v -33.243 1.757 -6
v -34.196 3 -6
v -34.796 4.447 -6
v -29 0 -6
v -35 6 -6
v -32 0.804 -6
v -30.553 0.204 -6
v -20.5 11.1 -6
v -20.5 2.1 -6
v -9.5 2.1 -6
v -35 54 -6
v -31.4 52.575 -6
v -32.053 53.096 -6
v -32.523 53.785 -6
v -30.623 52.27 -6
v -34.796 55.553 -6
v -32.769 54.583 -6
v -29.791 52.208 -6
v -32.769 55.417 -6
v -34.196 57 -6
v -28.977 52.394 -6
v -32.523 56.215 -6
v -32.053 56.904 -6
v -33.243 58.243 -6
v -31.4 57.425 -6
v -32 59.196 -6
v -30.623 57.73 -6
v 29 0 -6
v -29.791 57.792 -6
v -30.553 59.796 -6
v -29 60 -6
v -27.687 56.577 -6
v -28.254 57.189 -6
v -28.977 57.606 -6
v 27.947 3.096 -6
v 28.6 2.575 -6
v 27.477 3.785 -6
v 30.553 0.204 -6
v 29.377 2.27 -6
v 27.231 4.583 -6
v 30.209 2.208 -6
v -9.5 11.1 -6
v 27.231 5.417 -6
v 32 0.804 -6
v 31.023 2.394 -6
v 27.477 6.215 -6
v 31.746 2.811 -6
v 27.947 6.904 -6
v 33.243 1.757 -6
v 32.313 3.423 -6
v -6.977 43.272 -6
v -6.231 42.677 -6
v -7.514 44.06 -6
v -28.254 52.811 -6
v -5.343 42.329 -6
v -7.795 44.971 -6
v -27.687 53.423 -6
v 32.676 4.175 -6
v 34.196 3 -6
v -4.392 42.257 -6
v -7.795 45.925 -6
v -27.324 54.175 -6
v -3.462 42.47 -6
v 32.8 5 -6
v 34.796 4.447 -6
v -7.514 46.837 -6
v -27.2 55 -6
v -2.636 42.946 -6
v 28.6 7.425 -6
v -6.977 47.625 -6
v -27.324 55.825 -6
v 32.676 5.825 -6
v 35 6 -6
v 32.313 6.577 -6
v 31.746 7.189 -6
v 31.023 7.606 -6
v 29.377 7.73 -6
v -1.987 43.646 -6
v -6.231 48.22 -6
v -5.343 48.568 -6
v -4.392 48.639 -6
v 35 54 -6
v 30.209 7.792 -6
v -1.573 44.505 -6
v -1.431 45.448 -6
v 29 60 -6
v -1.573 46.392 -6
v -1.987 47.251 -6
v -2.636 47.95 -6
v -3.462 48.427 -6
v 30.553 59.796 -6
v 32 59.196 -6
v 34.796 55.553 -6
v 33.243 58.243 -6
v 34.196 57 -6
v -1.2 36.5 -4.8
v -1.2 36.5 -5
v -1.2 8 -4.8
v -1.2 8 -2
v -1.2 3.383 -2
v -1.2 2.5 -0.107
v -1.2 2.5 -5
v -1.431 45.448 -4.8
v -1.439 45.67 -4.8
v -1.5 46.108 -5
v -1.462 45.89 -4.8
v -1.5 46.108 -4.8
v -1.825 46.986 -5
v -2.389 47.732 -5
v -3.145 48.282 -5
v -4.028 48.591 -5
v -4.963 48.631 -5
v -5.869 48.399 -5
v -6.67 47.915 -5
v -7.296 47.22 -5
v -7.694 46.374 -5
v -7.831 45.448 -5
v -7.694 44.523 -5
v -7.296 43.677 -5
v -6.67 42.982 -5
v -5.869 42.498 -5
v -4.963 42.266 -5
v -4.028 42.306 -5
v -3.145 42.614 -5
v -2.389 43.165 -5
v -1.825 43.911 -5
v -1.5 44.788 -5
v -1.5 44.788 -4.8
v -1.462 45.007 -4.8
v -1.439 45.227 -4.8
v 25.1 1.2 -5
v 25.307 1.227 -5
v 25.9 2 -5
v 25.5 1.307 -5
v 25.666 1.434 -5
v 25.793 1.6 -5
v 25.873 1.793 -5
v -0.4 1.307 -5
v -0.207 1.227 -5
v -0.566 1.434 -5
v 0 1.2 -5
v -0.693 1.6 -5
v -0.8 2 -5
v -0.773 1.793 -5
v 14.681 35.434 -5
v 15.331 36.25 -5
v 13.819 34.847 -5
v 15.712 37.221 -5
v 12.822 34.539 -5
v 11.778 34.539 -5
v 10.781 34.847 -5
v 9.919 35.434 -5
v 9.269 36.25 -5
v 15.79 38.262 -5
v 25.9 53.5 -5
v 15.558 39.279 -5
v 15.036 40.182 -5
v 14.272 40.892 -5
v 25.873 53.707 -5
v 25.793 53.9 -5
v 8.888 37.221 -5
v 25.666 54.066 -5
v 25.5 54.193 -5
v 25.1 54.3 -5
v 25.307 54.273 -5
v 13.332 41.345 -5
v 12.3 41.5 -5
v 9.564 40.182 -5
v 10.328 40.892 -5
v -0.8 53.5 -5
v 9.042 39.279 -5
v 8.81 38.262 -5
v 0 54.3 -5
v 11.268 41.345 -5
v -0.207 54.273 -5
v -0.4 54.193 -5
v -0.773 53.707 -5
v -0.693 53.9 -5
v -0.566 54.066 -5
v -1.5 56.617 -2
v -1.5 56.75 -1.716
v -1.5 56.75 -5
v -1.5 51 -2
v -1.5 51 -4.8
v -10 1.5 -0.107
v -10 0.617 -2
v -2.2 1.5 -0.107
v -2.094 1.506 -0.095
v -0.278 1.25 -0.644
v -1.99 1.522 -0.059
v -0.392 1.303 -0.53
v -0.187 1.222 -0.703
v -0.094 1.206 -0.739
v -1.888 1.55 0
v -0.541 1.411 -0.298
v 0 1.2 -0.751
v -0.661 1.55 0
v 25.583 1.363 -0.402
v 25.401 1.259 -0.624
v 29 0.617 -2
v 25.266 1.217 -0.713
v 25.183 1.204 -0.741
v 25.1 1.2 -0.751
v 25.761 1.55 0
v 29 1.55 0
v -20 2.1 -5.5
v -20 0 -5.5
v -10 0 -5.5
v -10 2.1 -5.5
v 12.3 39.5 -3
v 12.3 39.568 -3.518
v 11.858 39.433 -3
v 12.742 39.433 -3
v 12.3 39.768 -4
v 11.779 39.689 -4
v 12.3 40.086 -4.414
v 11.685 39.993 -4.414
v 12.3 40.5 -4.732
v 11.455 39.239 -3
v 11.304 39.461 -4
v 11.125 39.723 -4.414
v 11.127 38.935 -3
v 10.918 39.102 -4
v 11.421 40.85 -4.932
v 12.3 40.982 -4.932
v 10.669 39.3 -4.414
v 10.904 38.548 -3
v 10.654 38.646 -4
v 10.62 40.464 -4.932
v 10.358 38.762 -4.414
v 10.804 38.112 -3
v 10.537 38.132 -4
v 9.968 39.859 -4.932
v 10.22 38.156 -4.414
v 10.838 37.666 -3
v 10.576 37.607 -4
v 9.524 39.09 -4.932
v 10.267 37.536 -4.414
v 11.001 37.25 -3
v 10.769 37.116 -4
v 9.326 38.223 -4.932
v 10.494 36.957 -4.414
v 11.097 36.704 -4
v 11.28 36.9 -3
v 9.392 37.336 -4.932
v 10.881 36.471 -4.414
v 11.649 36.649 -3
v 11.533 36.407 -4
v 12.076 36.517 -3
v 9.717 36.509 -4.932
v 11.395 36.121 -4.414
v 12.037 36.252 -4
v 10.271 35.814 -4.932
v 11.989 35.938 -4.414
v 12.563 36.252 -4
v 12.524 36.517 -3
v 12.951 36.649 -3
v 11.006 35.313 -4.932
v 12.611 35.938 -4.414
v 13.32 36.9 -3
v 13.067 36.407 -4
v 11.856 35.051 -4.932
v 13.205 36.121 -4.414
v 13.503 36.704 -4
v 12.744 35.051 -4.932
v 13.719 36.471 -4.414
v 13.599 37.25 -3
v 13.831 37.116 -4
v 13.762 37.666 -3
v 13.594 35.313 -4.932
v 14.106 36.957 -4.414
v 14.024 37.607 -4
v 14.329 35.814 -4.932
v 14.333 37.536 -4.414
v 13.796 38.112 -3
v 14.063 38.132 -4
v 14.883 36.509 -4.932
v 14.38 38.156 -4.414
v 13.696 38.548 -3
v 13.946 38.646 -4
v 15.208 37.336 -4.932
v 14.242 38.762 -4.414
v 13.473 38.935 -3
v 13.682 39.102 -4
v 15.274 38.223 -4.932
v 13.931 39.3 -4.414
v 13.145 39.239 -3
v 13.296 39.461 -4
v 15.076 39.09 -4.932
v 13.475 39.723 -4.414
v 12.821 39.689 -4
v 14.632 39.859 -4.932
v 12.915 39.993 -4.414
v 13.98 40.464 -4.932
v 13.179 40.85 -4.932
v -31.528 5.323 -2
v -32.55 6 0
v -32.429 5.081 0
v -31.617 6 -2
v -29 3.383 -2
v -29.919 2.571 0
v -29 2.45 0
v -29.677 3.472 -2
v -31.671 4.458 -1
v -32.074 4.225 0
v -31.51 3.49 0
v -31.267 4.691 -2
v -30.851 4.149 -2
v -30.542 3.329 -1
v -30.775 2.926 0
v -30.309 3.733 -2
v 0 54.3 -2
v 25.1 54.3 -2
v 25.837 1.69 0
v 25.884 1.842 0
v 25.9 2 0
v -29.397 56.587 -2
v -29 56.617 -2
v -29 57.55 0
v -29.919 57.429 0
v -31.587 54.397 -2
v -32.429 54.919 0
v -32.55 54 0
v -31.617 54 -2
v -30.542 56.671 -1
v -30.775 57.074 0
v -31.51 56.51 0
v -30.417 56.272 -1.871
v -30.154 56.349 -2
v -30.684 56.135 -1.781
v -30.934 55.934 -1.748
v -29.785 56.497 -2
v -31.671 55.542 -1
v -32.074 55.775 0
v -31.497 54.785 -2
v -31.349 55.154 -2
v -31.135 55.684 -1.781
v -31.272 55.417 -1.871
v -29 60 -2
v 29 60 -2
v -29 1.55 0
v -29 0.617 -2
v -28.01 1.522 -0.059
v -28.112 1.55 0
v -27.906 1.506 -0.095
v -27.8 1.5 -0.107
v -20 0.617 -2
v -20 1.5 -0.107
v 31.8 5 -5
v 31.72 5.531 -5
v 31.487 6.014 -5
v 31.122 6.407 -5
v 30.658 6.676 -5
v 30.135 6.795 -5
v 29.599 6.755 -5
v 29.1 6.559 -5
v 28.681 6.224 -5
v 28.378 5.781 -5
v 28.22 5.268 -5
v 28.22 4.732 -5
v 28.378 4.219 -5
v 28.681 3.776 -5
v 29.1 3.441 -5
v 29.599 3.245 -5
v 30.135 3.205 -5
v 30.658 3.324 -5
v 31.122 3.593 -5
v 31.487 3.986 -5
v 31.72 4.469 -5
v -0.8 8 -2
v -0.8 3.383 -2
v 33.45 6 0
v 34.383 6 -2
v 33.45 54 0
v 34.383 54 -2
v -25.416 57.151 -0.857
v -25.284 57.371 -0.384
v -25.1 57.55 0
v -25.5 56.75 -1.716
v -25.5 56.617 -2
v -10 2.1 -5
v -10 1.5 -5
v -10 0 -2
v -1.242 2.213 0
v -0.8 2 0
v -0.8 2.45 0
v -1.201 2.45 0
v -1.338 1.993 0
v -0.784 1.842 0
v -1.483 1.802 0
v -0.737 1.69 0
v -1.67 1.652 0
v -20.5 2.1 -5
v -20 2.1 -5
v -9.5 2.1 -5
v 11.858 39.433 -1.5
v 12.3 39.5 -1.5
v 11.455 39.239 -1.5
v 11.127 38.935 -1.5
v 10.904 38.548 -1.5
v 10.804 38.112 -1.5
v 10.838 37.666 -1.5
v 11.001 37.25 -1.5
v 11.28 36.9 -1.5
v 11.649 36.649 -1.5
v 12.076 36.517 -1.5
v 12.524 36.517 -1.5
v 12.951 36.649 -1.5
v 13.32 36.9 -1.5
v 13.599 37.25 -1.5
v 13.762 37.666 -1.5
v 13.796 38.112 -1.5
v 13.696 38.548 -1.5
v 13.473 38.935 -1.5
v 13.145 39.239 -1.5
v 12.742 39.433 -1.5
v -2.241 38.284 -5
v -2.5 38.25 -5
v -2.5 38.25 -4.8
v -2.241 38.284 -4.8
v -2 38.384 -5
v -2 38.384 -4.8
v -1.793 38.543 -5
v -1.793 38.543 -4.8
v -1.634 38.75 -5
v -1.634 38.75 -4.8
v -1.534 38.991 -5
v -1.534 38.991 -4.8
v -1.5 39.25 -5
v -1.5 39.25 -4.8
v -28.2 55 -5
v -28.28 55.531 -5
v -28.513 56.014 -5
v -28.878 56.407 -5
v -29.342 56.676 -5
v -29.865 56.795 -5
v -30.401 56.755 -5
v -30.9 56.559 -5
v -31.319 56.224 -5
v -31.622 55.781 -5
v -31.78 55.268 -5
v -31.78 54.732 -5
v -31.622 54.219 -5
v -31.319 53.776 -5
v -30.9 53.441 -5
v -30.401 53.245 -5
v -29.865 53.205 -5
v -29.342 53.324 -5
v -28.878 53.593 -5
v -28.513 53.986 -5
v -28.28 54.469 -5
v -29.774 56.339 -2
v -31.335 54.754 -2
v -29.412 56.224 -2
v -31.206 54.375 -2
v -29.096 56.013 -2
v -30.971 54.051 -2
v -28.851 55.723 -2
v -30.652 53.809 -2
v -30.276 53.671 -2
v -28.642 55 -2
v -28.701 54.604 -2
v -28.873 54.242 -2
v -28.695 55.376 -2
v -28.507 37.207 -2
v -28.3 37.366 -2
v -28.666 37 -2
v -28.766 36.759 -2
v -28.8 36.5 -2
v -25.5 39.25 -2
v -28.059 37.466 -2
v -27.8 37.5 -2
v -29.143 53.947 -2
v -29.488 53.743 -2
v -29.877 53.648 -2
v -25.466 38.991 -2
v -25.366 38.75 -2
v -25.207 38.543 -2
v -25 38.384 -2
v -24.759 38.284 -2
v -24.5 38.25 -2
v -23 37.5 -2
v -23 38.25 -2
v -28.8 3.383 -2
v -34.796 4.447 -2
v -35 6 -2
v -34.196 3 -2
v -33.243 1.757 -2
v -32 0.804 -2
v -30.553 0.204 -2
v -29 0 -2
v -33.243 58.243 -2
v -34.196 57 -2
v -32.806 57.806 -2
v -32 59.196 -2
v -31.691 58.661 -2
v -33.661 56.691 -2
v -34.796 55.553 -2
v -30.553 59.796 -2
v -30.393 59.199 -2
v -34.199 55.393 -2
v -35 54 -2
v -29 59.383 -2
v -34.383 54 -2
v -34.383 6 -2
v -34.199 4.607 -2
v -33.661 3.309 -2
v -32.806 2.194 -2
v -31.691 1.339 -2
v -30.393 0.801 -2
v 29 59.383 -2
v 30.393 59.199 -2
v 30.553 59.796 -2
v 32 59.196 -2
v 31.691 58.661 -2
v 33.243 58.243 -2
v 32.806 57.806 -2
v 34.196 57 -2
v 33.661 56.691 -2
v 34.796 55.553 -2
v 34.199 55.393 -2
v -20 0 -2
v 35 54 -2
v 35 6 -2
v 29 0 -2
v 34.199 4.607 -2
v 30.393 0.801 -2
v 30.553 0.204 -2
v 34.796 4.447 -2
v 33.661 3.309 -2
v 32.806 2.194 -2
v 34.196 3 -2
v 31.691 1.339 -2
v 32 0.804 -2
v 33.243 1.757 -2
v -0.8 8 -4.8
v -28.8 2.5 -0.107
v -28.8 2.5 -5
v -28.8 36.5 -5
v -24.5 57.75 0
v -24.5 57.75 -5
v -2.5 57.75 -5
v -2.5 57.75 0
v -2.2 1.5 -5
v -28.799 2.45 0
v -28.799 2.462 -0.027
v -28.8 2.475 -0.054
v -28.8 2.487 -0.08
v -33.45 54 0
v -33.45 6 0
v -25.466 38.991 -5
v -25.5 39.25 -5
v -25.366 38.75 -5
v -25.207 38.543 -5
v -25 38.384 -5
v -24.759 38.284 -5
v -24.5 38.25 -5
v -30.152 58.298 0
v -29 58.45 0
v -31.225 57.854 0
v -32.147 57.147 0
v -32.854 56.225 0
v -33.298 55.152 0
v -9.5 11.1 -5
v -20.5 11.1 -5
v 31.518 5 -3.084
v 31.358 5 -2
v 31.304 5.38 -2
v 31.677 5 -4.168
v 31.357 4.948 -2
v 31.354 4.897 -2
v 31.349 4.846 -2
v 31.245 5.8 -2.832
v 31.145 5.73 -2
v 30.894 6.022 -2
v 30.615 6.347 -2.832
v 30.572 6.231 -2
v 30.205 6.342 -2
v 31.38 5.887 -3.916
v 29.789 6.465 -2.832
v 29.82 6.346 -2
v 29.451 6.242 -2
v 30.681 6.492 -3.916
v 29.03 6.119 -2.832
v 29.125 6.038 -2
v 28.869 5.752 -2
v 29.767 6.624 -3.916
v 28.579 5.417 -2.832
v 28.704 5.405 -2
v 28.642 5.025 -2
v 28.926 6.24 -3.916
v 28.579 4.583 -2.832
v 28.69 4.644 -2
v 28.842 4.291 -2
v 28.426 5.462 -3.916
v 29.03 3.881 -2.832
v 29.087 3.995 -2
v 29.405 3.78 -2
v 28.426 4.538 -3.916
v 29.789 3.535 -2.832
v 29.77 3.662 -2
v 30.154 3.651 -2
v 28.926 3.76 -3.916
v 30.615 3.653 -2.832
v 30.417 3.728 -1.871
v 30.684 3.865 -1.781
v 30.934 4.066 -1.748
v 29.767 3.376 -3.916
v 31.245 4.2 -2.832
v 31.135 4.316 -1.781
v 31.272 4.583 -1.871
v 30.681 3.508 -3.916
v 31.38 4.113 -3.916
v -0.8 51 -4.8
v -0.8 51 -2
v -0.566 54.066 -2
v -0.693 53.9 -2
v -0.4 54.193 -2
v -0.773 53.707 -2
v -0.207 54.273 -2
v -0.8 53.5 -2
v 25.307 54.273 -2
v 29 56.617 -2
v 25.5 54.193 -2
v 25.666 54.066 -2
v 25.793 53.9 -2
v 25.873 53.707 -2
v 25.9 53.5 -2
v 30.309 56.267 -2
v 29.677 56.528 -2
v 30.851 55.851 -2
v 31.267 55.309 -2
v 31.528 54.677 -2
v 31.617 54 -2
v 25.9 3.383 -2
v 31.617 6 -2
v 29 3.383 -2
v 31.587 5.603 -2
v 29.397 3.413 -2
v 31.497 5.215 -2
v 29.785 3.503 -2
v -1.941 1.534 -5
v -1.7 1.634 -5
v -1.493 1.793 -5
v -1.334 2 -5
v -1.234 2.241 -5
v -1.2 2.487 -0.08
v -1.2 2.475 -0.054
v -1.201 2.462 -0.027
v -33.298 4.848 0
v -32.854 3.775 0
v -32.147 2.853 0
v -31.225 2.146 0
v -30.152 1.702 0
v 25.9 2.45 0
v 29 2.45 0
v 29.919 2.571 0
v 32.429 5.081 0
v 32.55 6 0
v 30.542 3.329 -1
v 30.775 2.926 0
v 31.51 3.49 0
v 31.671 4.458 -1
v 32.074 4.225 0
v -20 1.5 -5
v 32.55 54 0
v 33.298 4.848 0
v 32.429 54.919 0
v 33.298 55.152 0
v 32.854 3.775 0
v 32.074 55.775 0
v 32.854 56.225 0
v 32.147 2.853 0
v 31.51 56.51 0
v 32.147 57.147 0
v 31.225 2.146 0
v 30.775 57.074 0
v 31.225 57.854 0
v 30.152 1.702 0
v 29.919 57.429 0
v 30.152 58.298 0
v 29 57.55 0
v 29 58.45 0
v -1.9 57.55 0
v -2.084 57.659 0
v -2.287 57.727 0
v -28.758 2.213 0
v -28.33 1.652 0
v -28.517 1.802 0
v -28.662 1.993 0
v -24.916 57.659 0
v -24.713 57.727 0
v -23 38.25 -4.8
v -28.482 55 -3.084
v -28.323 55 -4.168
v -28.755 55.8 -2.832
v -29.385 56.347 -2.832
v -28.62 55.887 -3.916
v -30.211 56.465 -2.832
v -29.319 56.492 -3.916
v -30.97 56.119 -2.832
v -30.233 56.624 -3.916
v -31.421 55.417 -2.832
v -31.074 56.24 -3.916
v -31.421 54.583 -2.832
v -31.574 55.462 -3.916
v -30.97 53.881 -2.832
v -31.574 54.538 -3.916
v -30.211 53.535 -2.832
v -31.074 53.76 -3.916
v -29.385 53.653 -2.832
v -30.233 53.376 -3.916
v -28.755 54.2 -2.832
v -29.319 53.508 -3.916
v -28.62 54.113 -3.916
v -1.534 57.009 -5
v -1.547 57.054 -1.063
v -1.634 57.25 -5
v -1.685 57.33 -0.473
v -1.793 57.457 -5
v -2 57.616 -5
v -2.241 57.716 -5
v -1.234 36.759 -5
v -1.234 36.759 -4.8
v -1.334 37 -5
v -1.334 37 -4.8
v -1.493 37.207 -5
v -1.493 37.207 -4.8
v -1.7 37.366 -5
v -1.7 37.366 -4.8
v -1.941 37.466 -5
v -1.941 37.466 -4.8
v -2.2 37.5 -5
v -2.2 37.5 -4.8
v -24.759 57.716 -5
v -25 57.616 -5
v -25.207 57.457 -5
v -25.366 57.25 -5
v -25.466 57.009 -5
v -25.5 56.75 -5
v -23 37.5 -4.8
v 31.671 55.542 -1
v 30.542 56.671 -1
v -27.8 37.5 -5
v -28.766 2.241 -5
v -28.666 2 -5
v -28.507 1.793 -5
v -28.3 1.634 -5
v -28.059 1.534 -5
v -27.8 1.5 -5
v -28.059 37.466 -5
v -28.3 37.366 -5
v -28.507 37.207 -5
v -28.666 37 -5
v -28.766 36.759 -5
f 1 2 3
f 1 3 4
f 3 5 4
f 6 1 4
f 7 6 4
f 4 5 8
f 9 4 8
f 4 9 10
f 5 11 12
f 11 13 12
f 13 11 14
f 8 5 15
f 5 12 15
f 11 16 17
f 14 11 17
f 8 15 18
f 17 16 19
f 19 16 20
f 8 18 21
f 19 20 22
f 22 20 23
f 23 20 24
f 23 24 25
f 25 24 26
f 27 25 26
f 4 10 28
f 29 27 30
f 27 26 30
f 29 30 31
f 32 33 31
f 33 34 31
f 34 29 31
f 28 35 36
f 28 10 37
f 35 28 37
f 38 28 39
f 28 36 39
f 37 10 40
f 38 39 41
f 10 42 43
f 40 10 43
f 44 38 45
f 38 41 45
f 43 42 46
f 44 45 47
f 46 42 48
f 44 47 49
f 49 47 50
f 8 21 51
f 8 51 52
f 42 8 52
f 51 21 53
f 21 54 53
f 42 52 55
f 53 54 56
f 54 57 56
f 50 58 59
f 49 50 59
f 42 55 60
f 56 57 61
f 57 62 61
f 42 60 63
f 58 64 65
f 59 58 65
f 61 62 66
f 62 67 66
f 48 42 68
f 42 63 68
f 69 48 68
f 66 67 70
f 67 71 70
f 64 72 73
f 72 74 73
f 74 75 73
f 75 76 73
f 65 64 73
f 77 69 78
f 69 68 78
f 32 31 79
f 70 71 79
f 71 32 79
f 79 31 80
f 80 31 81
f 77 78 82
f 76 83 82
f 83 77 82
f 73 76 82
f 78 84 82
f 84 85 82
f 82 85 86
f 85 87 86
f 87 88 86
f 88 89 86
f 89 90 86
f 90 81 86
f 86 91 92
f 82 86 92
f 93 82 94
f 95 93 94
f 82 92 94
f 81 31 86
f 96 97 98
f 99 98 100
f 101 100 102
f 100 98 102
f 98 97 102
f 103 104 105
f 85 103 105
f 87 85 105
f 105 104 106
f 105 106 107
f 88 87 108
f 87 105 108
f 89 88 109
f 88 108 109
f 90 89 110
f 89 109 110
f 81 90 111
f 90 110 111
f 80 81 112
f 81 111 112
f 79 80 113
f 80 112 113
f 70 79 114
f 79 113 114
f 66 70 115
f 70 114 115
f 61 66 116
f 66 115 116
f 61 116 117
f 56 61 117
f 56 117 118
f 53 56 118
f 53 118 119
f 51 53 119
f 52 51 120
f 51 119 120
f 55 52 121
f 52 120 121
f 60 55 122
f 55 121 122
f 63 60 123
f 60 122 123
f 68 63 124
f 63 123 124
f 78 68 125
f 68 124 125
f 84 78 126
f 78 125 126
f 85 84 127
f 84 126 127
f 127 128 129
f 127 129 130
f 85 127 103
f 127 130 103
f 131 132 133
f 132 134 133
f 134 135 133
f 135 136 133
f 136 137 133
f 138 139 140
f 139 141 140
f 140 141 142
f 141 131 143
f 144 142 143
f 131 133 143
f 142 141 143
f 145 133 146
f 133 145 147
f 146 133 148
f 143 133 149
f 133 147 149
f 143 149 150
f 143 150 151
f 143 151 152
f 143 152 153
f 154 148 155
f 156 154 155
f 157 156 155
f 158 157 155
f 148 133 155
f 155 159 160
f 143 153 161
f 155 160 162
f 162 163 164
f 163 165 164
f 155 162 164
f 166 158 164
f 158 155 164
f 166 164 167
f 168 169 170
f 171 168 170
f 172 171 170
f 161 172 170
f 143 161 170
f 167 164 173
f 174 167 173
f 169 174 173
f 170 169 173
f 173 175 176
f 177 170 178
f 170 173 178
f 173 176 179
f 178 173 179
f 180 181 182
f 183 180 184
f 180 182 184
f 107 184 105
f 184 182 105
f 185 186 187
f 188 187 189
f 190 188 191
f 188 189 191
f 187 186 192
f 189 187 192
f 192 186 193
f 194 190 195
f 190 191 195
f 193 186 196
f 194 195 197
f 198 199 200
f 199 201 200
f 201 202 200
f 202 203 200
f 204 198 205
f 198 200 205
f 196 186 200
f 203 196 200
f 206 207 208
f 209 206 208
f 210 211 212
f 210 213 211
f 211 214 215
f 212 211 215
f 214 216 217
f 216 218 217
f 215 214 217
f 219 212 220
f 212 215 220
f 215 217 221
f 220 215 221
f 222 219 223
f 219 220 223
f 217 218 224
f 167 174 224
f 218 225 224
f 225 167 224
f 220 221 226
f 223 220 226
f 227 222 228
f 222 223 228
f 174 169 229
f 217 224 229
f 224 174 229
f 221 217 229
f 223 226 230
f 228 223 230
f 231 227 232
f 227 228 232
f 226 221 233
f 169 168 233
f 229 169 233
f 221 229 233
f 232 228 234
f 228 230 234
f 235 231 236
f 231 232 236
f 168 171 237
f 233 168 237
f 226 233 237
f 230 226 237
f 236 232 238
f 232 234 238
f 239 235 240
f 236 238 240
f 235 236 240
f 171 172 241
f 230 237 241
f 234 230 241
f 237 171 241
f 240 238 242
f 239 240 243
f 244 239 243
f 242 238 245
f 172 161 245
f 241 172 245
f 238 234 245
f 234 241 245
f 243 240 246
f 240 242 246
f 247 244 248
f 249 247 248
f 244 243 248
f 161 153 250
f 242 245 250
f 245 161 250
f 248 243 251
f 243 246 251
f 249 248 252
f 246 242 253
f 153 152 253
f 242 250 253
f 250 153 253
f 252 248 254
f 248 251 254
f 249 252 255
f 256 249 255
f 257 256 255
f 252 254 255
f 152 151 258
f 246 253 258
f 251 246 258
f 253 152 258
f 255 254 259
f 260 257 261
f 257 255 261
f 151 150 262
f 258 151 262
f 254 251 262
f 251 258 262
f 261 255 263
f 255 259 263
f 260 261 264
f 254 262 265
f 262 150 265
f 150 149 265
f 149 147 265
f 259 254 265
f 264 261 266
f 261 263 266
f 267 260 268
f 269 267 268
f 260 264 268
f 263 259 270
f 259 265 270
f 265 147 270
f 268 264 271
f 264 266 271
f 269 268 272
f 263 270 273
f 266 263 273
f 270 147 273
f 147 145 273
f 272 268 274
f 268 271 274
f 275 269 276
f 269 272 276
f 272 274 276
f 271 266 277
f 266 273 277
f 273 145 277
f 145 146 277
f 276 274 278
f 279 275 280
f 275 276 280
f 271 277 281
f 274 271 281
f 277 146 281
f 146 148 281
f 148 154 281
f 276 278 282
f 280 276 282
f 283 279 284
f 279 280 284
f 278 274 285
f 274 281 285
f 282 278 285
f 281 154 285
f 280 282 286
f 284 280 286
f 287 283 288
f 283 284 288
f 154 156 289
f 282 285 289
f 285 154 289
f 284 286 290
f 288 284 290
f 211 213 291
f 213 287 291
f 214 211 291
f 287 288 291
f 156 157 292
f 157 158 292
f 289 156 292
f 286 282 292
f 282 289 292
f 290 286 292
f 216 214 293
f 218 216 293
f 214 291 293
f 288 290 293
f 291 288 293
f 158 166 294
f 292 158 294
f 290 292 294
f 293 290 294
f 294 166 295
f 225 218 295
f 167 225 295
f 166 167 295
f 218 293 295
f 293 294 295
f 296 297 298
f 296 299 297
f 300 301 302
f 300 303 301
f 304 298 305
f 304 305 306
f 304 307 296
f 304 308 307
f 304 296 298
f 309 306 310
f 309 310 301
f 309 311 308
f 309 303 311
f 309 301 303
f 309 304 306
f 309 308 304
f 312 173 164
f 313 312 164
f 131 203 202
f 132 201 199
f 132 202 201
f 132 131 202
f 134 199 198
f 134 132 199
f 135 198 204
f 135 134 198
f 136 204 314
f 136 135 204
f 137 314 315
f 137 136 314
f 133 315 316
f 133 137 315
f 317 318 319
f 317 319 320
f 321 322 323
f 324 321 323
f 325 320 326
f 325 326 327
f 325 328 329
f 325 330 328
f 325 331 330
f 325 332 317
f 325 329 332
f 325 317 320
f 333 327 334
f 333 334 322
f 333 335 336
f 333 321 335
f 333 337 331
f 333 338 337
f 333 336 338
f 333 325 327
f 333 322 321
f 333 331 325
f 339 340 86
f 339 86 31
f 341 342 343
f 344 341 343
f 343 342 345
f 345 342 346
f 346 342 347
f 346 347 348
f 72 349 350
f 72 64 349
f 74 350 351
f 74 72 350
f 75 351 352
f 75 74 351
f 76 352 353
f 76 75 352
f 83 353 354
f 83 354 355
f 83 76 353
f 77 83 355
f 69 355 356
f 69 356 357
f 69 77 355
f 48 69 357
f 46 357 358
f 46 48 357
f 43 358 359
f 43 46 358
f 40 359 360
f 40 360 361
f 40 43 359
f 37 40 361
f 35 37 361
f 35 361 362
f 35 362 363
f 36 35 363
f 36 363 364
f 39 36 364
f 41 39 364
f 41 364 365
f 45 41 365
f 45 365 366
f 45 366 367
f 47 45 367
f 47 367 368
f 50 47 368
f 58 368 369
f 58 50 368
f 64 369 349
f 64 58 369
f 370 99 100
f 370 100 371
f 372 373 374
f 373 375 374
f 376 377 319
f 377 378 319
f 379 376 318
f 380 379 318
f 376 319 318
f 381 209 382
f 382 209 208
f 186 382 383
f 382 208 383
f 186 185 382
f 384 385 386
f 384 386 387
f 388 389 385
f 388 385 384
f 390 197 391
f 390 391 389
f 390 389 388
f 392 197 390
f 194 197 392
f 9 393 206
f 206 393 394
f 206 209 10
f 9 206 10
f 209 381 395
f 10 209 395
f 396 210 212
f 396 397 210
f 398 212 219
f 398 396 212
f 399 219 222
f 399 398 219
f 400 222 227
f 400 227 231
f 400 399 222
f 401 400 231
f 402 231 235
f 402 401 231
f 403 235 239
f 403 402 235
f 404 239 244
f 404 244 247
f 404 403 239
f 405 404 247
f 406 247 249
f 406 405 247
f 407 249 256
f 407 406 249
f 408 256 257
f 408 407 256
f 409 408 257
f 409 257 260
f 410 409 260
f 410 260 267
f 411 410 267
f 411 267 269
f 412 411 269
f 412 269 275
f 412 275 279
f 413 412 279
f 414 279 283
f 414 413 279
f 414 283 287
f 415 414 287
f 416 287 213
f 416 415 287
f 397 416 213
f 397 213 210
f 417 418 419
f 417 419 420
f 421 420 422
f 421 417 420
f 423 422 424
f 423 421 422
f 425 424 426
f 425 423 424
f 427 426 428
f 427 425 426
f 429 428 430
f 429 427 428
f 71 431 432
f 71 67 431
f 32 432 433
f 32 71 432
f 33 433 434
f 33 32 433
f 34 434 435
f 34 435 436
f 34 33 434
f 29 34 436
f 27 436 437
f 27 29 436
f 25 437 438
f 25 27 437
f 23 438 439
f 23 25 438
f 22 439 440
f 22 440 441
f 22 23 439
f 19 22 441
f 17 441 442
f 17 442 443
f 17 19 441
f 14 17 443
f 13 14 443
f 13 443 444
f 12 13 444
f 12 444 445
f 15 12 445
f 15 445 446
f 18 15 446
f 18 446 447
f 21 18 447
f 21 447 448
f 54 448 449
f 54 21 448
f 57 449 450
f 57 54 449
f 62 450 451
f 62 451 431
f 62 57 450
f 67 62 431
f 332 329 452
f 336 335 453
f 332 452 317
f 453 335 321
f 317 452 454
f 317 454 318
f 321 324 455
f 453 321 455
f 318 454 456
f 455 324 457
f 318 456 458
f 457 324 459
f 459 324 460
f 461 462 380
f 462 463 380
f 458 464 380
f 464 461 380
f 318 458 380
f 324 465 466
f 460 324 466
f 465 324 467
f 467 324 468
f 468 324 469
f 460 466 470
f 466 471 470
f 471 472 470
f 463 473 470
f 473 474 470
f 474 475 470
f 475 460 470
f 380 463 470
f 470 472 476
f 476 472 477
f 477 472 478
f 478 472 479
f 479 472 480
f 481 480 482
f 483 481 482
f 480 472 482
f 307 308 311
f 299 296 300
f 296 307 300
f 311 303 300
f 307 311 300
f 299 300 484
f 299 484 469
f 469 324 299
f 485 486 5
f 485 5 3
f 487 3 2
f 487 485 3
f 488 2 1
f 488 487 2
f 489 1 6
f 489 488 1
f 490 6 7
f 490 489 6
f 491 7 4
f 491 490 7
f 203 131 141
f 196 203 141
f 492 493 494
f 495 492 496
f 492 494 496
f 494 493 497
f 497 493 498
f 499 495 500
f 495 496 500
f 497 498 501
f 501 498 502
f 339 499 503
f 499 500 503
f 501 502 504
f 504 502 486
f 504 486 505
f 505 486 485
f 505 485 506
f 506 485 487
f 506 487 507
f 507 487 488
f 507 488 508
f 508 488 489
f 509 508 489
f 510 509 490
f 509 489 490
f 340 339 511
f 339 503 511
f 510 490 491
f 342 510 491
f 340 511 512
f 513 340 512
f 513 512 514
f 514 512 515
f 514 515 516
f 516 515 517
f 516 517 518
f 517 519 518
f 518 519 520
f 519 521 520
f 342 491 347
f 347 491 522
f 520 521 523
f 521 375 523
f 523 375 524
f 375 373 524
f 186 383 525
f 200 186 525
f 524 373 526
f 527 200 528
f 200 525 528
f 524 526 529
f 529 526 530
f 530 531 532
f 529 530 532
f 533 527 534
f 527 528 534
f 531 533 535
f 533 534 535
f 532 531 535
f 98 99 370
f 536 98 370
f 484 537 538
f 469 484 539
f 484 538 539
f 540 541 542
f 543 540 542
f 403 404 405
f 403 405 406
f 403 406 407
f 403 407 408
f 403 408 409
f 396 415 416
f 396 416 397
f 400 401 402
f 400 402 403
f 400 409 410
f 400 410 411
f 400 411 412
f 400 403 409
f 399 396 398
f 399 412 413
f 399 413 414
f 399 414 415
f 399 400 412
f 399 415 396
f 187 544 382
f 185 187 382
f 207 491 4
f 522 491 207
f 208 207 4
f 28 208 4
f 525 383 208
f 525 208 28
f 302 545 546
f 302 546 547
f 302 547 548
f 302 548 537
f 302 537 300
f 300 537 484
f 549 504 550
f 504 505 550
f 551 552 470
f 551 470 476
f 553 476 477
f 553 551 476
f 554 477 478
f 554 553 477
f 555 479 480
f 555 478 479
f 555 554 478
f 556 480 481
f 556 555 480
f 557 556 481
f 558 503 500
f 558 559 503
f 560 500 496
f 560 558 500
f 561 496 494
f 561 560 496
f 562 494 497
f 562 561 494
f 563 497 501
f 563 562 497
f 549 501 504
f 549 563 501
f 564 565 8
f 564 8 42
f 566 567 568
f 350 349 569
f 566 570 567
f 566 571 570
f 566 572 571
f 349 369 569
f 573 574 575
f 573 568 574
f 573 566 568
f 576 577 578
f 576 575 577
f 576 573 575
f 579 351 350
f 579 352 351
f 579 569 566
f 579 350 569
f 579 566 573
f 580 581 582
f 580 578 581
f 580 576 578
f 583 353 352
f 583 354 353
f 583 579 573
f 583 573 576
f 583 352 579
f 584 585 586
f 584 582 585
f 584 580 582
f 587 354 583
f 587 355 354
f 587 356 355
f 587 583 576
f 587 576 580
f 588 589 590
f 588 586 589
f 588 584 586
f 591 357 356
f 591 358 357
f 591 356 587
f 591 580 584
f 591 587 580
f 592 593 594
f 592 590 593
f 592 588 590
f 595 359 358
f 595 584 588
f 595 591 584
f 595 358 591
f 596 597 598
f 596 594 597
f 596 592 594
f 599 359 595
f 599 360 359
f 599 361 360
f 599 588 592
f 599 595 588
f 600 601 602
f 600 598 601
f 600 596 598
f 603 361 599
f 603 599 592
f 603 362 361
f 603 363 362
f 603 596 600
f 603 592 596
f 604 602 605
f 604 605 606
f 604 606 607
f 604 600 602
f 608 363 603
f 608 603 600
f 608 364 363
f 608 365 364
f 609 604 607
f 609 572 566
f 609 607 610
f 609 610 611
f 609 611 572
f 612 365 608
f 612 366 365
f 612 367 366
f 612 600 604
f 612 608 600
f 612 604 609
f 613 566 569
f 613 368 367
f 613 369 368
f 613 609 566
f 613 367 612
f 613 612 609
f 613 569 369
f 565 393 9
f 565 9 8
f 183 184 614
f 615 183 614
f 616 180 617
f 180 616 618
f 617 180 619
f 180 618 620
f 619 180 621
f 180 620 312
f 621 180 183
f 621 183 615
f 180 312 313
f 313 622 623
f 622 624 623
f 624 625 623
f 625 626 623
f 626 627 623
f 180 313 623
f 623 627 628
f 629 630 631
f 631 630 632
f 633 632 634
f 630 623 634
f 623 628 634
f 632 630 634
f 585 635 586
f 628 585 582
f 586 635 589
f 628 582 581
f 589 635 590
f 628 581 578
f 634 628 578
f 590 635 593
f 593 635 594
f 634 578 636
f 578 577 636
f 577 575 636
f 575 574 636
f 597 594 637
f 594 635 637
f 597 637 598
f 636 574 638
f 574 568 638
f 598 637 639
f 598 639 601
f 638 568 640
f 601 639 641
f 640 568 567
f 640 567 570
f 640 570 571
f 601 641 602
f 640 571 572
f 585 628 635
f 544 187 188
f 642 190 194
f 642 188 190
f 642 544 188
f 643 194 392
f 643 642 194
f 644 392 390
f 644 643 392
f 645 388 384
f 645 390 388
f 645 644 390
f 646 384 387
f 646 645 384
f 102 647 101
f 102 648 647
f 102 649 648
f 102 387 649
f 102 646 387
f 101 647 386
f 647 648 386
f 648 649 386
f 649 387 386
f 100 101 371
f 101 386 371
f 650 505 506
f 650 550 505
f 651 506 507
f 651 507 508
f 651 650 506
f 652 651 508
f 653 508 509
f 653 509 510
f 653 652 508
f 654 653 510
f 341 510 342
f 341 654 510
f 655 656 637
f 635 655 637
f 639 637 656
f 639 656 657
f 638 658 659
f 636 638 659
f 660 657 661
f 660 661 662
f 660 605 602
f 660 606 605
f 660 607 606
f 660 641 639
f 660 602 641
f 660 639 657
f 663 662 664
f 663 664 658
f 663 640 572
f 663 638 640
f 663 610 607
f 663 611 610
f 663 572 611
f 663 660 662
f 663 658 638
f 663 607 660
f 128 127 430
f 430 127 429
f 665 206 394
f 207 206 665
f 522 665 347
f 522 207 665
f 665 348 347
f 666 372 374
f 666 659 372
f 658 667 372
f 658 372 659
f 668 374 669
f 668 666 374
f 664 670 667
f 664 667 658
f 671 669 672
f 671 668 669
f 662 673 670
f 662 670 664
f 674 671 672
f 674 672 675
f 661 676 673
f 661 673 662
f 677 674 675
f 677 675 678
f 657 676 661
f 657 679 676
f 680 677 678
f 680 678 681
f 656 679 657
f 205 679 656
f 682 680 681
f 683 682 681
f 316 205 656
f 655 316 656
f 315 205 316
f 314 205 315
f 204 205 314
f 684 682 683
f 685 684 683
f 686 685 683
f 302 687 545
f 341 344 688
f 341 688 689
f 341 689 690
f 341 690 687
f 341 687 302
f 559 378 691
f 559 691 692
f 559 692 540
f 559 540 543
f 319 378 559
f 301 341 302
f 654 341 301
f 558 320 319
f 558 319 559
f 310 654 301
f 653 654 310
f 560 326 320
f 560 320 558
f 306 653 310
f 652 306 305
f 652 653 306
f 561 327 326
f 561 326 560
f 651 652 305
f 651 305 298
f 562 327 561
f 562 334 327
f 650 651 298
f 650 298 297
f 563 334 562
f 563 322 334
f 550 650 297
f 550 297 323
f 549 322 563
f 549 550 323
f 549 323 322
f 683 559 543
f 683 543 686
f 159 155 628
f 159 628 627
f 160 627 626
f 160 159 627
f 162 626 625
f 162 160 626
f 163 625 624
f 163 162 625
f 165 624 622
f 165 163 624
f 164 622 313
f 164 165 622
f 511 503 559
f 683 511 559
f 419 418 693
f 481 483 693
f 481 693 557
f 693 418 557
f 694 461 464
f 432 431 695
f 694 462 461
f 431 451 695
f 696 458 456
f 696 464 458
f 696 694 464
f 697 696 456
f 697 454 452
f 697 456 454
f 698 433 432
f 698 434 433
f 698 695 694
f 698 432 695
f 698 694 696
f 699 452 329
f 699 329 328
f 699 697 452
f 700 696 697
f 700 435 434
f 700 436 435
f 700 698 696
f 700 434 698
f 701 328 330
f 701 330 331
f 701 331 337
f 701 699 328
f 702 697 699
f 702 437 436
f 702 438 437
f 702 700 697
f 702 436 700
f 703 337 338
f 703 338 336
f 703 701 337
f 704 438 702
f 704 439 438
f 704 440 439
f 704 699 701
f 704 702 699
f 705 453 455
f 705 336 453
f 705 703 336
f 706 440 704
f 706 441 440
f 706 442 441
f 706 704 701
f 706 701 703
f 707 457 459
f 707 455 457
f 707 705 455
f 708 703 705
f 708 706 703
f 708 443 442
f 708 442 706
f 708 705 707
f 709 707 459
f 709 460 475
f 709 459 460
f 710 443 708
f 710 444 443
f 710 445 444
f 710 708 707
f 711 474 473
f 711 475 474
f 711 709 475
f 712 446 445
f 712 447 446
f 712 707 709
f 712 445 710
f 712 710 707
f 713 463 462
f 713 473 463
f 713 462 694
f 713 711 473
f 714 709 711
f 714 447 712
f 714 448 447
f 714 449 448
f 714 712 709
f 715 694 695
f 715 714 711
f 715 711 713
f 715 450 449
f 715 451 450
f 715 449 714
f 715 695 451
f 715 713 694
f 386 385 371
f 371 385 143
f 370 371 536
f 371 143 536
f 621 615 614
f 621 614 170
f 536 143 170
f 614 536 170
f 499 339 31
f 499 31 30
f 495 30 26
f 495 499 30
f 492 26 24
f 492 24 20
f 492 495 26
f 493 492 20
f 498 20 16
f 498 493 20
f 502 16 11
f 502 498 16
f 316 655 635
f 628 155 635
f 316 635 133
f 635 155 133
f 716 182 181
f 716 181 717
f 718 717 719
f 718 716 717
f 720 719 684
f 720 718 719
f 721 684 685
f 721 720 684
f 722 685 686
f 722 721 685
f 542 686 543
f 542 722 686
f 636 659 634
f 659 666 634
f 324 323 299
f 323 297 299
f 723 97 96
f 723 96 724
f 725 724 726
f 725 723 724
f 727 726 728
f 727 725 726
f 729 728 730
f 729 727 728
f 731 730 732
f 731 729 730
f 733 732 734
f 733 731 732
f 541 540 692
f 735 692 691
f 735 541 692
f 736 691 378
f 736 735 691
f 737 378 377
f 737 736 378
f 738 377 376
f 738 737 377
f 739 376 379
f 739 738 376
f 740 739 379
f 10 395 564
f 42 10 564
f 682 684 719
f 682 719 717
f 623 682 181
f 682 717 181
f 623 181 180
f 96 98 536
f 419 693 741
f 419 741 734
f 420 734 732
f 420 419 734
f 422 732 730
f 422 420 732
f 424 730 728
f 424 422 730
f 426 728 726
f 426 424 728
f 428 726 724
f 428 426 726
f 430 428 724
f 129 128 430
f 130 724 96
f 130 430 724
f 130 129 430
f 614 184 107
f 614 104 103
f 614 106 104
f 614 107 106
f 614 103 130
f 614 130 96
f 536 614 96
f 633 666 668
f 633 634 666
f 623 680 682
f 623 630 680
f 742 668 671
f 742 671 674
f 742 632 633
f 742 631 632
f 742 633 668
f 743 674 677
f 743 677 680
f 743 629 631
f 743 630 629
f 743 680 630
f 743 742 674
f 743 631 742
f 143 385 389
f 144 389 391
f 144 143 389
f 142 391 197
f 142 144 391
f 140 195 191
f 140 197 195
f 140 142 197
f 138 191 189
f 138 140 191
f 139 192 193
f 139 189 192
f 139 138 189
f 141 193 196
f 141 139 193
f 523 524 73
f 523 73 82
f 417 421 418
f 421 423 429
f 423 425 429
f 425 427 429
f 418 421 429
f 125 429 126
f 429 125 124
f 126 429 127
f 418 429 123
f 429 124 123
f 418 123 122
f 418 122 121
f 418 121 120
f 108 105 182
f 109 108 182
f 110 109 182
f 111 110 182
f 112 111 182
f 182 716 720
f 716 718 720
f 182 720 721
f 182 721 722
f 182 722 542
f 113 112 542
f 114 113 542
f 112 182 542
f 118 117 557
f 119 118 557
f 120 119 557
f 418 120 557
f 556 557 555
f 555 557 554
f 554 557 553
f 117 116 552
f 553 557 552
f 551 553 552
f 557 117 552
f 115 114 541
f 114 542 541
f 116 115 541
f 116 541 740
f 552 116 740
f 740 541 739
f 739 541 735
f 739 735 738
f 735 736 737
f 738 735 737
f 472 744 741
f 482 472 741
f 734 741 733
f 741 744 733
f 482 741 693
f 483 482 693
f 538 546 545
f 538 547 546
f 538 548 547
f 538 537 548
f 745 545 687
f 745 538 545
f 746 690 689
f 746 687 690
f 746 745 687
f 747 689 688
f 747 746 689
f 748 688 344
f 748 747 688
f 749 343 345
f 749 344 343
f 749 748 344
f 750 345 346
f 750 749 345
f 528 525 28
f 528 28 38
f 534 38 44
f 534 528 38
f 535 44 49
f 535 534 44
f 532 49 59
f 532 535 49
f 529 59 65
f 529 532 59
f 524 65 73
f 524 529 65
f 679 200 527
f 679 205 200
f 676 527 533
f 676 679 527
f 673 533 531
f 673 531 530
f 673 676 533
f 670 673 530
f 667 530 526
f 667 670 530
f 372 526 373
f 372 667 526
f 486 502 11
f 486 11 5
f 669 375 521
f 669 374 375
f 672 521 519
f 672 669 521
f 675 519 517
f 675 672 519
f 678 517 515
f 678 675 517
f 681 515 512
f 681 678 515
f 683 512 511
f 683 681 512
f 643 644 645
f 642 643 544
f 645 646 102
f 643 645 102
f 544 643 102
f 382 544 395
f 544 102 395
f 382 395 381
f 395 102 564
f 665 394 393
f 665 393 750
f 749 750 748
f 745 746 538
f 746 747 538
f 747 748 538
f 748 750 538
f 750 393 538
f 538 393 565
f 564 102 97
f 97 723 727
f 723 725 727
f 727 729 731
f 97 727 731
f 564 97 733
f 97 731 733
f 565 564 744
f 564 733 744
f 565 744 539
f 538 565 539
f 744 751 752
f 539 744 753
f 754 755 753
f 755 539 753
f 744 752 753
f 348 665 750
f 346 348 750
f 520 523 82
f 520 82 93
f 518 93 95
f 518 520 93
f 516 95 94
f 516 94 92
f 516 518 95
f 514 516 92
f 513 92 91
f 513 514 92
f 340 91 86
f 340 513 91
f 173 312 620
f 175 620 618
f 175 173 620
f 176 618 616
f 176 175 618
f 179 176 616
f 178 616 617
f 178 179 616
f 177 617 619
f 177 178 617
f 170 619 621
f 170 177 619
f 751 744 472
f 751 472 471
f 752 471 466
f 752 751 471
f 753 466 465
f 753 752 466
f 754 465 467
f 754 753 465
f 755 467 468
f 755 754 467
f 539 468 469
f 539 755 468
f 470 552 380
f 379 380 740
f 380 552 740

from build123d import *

# Parameters (mm, degrees)
PAD015_DEPTH         = 6
SKETCH035_W          = 80
SKETCH035_H          = 14
POCKET011_DEPTH      = 60.001
POCKET011_DEPTH_BACK = 0.001
POCKET020_DEPTH      = 5.001
POCKET021_DEPTH      = 5.001
POCKET022_DEPTH      = 5.001
SKETCH054_W          = 34
SKETCH054_H          = 43
POCKET023_DEPTH      = 4.801
SKETCH055_R          = 3.2
POCKET024_DEPTH      = 6.001
SKETCH056_W          = 11
SKETCH056_H          = 9
POCKET025_DEPTH      = 6.001
SKETCH057_W          = 10
SKETCH057_H          = 8
POCKET026_DEPTH      = 5


with BuildPart() as part:
    # Sketch033 → Pad015 (new body, symmetric)
    with BuildSketch(Plane.XY):
        with BuildLine():
            Line((29, 60), (-29, 60))
            ThreePointArc((-29, 60), (-33.242641, 58.242641), (-35, 54))
            Line((-35, 54), (-35, 6))
            ThreePointArc((-35, 6), (-33.242641, 1.757359), (-29, 0))
            Line((-29, 0), (29, 0))
            ThreePointArc((29, 0), (33.242641, 1.757359), (35, 6))
            Line((35, 6), (35, 54))
            ThreePointArc((35, 54), (33.242641, 58.242641), (29, 60))
        make_face()
    extrude(amount=PAD015_DEPTH, both=True)

    # Sketch035 → Pocket011 (cut, two sides)
    with BuildSketch(Plane.XZ) as pocket011_sk:
        with Locations((0, 5)):
            Rectangle(SKETCH035_W, SKETCH035_H)
    extrude(amount=-POCKET011_DEPTH, mode=Mode.SUBTRACT)
    extrude(pocket011_sk.sketch, amount=POCKET011_DEPTH_BACK, mode=Mode.SUBTRACT)

    # AdditivePipe: sweep along a path in Sketch033
    with BuildLine(Plane.XY) as additivepipe_path:
        Line((29, 60), (-29, 60))
        ThreePointArc((-29, 60), (-33.242641, 58.242641), (-35, 54))
        Line((-35, 54), (-35, 6))
        ThreePointArc((-35, 6), (-33.242641, 1.757359), (-29, 0))
        Line((-29, 0), (29, 0))
        ThreePointArc((29, 0), (33.242641, 1.757359), (35, 6))
        Line((35, 6), (35, 54))
        ThreePointArc((35, 54), (33.242641, 58.242641), (29, 60))
    # Sketch058 → AdditivePipe (sweep)
    with BuildSketch(Plane.XZ.offset(-30)):
        Polygon((34.382615, -2), (31.617385, -2), (32.55, 0), (33.45, 0), align=None)
    sweep(path=additivepipe_path.line)

    # Sketch050 → Pocket020 (cut, through all)
    with BuildSketch(Plane.XY.offset(-5)):
        with BuildLine():
            Line((0, 54.3), (25.1, 54.3))
            ThreePointArc((25.9, 53.5), (25.665685, 54.065685), (25.1, 54.3))
            Line((25.9, 53.5), (25.9, 2))
            ThreePointArc((25.1, 1.2), (25.665685, 1.434315), (25.9, 2))
            Line((25.1, 1.2), (0, 1.2))
            ThreePointArc((-0.8, 2), (-0.565685, 1.434315), (0, 1.2))
            Line((-0.8, 2), (-0.8, 53.5))
            ThreePointArc((0, 54.3), (-0.565685, 54.065685), (-0.8, 53.5))
        make_face()
    extrude(amount=POCKET020_DEPTH, mode=Mode.SUBTRACT)

    # Sketch052 → Pocket021 (cut, through all)
    with BuildSketch(Plane(origin=(0, -6, -5), x_dir=(1, 0, 0), z_dir=(0, 0, 1))):
        with BuildLine():
            Line((-27.8, 43.5), (-2.2, 43.5))
            ThreePointArc((-1.2, 42.5), (-1.492893, 43.207107), (-2.2, 43.5))
            Line((-1.2, 42.5), (-1.2, 8.5))
            ThreePointArc((-2.2, 7.5), (-1.492893, 7.792893), (-1.2, 8.5))
            Line((-2.2, 7.5), (-27.8, 7.5))
            ThreePointArc((-28.8, 8.5), (-28.507107, 7.792893), (-27.8, 7.5))
            Line((-28.8, 8.5), (-28.8, 42.5))
            ThreePointArc((-27.8, 43.5), (-28.507107, 43.207107), (-28.8, 42.5))
        make_face()
    extrude(amount=POCKET021_DEPTH, mode=Mode.SUBTRACT)

    # Sketch051 → Pocket022 (cut, through all)
    with BuildSketch(Plane(origin=(0, -6, -5), x_dir=(1, 0, 0), z_dir=(0, 0, 1))):
        with BuildLine():
            Line((-24.5, 63.75), (-2.5, 63.75))
            ThreePointArc((-1.5, 62.75), (-1.792893, 63.457107), (-2.5, 63.75))
            Line((-1.5, 62.75), (-1.5, 45.25))
            ThreePointArc((-2.5, 44.25), (-1.792893, 44.542893), (-1.5, 45.25))
            Line((-2.5, 44.25), (-24.5, 44.25))
            ThreePointArc((-25.5, 45.25), (-25.207107, 44.542893), (-24.5, 44.25))
            Line((-25.5, 45.25), (-25.5, 62.75))
            ThreePointArc((-24.5, 63.75), (-25.207107, 63.457107), (-25.5, 62.75))
        make_face()
    extrude(amount=POCKET022_DEPTH, mode=Mode.SUBTRACT)

    # Sketch047 → Groove002 (revolve, cut)
    with BuildSketch(Plane.XZ.offset(-55)):
        Polygon((-30, 4.5), (-29.6, 4.5), (-28.2, -5), (-27.2, -6), (-30, -6), align=None)
    revolve(axis=Axis((-30, 55, 4.5), (0, 0, 1)), mode=Mode.SUBTRACT)

    # Sketch046 → Groove003 (revolve, cut)
    with BuildSketch(Plane.XZ.offset(-5)):
        Polygon((30, 4.5), (30.4, 4.5), (31.8, -5), (32.8, -6), (30, -6), align=None)
    revolve(axis=Axis((30, 5, 4.5), (0, 0, 1)), mode=Mode.SUBTRACT)

    # Sketch054 → Pocket023 (cut, through all)
    with BuildSketch(Plane.XY.offset(-4.8)):
        with Locations((-6, 29.5)):
            Rectangle(SKETCH054_W, SKETCH054_H)
    extrude(amount=POCKET023_DEPTH, mode=Mode.SUBTRACT)

    # Sketch055 → Pocket024 (cut, through all)
    with BuildSketch(Plane.XY):
        with Locations((-4.631189, 45.448315)):
            Circle(SKETCH055_R)
    extrude(amount=-POCKET024_DEPTH, mode=Mode.SUBTRACT)

    # Sketch056 → Pocket025 (cut, through all)
    with BuildSketch(Plane.XY):
        with Locations((-15, 6.6)):
            Rectangle(SKETCH056_W, SKETCH056_H)
    extrude(amount=-POCKET025_DEPTH, mode=Mode.SUBTRACT)

    # Sketch057 → Pocket026 (cut)
    with BuildSketch(Plane.XZ):
        with Locations((-15, -1.5)):
            Rectangle(SKETCH057_W, SKETCH057_H)
    extrude(amount=-POCKET026_DEPTH, mode=Mode.SUBTRACT)

    # Sketch053 → Revolution002 (revolve)
    with BuildSketch(Plane.YZ.offset(12.3)):
        with BuildLine():
            Line((38, -1.5), (38, -5))
            Line((38, -5), (41.5, -5))
            ThreePointArc((39.5, -3), (40.085786, -4.414214), (41.5, -5))
            Line((39.5, -3), (39.5, -1.5))
            Line((39.5, -1.5), (38, -1.5))
        make_face()
    revolve(axis=Axis((12.3, 38, -1.5), (0, 0, 1)))


solid = part.part
